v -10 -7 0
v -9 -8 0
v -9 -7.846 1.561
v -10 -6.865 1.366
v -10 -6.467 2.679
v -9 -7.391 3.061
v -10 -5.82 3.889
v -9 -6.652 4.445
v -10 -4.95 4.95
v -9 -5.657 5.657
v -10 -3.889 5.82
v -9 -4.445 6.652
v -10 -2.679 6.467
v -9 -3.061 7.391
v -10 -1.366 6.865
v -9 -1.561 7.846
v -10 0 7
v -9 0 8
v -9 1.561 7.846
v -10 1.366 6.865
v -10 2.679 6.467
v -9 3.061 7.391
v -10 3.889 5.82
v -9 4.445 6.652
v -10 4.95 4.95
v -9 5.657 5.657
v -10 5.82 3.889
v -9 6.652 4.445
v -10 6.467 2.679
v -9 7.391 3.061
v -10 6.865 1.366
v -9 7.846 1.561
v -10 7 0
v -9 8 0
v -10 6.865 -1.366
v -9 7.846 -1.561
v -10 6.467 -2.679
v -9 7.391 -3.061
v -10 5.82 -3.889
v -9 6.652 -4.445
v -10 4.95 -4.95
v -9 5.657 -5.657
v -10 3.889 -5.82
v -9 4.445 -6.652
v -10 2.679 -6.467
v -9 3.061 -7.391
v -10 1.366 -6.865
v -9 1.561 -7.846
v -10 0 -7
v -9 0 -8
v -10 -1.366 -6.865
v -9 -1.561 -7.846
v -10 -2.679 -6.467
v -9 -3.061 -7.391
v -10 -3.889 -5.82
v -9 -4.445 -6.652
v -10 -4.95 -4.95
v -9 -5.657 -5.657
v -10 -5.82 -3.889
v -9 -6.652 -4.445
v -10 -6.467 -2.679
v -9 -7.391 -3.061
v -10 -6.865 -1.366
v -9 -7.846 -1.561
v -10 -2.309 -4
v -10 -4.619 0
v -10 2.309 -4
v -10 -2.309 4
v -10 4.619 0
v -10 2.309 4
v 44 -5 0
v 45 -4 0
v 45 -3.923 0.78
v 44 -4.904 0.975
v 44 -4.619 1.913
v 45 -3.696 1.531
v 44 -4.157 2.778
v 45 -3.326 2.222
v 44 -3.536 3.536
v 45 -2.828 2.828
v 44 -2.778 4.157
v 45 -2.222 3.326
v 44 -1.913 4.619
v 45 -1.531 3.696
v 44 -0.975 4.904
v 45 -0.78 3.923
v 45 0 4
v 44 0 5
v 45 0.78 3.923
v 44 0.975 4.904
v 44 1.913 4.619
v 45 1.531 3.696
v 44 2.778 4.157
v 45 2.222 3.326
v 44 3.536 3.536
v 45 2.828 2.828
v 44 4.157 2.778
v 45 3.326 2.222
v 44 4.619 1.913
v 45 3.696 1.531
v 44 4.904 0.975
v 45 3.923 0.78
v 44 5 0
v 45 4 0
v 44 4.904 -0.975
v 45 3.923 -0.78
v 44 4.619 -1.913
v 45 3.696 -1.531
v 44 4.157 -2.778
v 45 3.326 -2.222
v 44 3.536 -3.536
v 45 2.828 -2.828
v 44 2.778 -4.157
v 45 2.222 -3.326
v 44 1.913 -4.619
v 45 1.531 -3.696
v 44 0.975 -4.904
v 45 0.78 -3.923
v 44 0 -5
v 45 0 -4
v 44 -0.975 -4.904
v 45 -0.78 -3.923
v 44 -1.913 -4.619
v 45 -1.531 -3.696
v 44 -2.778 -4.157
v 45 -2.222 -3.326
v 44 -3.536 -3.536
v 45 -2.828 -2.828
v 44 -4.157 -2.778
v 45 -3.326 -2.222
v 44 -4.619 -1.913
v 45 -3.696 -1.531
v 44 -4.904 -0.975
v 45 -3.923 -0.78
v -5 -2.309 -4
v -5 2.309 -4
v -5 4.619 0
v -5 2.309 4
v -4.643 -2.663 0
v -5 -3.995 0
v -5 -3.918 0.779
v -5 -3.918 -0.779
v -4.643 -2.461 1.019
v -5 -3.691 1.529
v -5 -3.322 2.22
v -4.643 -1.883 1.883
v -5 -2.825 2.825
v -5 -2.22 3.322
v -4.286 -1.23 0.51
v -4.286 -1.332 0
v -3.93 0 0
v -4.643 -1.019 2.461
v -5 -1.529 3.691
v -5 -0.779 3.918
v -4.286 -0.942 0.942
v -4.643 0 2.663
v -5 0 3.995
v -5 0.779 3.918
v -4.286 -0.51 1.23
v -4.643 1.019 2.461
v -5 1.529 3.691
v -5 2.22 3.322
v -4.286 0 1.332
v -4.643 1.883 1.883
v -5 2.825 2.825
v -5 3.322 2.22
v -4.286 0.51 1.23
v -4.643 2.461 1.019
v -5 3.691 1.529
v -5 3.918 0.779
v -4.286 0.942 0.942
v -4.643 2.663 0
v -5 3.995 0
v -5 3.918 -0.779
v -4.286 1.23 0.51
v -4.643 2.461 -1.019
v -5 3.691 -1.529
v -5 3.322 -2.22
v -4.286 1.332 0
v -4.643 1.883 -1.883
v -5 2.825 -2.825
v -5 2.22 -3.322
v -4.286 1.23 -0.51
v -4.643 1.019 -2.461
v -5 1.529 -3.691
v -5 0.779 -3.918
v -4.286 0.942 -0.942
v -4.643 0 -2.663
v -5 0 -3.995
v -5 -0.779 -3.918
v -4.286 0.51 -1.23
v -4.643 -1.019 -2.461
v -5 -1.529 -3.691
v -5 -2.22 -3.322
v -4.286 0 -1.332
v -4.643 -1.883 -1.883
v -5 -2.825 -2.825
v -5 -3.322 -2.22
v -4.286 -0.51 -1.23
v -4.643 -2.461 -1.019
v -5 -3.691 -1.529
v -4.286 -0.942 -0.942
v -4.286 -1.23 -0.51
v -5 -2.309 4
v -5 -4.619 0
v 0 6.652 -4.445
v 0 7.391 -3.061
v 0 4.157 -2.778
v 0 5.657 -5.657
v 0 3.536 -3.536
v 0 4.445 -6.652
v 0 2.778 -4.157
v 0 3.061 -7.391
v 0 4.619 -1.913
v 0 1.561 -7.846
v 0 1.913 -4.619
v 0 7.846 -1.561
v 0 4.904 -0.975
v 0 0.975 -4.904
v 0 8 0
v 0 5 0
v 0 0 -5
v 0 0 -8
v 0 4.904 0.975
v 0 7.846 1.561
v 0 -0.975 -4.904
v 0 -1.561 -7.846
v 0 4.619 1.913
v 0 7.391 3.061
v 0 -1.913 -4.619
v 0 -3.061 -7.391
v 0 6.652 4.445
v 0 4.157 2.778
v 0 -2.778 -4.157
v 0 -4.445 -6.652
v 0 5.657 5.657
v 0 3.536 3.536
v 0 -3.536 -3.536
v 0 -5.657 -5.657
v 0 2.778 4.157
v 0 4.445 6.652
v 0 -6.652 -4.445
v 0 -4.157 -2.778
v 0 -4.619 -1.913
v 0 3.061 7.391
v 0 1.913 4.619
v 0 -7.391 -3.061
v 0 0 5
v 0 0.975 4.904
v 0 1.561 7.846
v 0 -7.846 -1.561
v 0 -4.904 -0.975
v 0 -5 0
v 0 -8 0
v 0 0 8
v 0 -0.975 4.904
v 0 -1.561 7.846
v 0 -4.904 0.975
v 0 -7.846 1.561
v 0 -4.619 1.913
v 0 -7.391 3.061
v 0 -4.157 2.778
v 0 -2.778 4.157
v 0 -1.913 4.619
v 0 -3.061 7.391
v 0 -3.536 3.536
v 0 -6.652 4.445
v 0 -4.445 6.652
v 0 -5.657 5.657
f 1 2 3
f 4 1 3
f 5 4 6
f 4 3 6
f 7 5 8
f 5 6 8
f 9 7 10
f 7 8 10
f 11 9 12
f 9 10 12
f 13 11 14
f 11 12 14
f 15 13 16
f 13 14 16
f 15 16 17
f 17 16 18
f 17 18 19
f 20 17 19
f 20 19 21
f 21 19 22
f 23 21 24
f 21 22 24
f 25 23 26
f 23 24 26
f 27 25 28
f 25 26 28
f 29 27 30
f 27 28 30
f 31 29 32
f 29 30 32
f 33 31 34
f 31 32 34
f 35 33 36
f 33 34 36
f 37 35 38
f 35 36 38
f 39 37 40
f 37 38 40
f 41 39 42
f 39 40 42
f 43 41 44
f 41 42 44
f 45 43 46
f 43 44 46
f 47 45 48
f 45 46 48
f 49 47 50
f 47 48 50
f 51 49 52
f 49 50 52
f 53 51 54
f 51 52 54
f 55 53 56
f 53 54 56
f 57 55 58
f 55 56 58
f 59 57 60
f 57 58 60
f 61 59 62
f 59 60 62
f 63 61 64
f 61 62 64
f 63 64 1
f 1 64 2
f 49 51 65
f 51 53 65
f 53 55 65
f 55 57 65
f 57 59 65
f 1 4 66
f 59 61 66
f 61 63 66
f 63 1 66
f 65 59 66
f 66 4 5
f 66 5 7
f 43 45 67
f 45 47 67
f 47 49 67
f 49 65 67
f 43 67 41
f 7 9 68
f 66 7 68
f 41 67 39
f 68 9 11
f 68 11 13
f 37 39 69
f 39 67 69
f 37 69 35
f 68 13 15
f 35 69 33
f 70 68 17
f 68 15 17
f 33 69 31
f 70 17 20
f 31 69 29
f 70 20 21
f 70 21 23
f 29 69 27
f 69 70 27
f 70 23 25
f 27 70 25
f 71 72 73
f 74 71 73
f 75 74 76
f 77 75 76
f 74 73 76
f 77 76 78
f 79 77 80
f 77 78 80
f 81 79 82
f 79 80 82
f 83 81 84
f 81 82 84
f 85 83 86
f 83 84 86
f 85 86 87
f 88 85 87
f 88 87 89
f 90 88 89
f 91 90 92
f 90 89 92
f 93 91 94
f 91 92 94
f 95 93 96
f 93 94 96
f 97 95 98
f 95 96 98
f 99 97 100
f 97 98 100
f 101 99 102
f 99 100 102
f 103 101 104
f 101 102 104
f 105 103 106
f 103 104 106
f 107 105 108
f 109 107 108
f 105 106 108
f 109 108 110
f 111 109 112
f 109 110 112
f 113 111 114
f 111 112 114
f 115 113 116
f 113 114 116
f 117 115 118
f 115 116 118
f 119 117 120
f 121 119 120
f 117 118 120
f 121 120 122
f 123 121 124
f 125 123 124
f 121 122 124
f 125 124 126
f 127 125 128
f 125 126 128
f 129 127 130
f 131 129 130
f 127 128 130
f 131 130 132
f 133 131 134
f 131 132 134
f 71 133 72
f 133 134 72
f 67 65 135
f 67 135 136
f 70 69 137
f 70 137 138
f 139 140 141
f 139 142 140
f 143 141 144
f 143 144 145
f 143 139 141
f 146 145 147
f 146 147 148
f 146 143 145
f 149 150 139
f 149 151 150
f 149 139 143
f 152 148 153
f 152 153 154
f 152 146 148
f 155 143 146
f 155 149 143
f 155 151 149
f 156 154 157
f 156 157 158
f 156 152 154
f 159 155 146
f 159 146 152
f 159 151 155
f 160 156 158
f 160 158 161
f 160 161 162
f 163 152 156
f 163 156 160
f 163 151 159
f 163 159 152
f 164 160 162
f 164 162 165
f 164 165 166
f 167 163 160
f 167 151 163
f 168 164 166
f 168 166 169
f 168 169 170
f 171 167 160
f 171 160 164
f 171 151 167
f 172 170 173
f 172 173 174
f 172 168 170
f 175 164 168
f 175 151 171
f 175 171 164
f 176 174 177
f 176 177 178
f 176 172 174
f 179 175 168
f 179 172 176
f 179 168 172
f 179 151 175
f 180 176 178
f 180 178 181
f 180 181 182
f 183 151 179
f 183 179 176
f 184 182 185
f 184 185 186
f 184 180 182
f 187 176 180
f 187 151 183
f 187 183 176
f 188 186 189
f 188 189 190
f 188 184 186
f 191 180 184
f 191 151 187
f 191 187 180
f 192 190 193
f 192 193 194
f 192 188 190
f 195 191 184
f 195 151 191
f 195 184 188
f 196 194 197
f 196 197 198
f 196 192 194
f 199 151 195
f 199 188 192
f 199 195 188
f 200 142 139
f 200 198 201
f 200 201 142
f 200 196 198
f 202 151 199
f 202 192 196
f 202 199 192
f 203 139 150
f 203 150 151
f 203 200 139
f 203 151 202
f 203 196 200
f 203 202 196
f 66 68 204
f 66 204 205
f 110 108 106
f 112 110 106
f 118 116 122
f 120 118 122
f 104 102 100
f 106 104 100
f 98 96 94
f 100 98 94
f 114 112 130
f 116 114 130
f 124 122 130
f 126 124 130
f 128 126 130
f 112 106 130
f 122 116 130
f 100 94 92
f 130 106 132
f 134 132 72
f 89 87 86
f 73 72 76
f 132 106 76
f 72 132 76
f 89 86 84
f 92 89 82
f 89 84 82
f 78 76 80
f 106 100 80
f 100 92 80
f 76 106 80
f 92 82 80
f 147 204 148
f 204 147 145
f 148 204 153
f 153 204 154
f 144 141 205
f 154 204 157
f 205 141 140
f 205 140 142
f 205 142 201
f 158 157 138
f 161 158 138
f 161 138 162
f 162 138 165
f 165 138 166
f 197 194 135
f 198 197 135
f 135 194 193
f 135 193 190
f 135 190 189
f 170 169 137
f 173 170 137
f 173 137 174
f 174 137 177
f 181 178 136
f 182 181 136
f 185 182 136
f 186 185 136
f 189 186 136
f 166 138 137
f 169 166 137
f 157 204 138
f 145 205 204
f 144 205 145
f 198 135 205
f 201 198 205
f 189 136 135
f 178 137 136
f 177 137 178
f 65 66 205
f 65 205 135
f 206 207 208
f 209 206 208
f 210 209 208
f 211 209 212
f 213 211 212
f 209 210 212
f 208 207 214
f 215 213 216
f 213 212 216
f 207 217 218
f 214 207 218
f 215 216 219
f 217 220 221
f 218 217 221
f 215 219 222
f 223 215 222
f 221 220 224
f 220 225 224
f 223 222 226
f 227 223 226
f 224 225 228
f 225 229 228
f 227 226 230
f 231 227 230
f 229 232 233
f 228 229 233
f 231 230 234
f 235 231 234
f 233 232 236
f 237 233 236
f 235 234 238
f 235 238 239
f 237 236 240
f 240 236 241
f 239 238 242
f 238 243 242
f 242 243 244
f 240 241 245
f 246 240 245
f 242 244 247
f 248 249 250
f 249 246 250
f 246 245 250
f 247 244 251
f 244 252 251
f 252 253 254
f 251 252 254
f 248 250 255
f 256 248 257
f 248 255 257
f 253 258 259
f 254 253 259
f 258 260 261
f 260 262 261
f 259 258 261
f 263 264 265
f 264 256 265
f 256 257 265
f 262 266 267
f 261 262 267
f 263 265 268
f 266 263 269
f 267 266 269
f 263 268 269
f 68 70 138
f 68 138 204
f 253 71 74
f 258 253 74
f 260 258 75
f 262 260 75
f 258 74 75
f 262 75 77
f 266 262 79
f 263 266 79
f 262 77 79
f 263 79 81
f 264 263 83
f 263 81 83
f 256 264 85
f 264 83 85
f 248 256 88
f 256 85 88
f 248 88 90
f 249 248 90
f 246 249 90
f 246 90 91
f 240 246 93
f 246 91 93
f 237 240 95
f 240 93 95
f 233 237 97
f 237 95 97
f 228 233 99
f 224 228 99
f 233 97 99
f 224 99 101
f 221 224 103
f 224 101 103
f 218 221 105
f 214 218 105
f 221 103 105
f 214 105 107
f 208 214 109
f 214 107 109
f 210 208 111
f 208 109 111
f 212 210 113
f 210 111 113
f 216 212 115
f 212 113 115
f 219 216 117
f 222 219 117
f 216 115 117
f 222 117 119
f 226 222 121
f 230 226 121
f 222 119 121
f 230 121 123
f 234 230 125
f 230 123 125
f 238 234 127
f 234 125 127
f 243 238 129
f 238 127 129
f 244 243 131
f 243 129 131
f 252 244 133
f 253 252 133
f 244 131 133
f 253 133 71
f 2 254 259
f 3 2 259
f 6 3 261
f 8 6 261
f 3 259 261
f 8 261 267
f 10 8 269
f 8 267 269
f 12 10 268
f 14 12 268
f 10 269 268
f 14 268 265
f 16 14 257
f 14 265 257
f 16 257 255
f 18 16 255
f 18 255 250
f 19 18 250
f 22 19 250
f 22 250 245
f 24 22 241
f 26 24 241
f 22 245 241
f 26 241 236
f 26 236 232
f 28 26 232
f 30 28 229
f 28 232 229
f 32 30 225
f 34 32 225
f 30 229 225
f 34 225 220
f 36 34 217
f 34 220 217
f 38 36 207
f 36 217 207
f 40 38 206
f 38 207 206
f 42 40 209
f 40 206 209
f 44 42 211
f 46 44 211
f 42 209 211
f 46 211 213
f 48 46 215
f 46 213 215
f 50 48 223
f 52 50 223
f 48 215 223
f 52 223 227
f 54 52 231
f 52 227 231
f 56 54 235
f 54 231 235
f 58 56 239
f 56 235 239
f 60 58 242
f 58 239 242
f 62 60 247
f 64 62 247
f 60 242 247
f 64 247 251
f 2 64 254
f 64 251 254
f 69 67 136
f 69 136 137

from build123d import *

# Parameters (mm, degrees)
CUT_EXTRUDE1_DEPTH = 5
CHAMFER1_SIZE      = 1


with BuildPart() as part:
    # Sketch1 → Revolve1 (revolve)
    with BuildSketch(Plane.XY, mode=Mode.PRIVATE) as revolve1_sk:
        Polygon((-10, 0), (-10, 8), (0, 8), (0, 5), (45, 5), (45, 0), align=None)
    revolve(revolve1_sk.sketch.rotate(Axis((45, 0, 0), (-1, 0, 0)), 180), axis=Axis((45, 0, 0), (-1, 0, 0)))

    # Sketch2 → Cut-Revolve1 (revolve, cut)
    with BuildSketch(Plane.XY, mode=Mode.PRIVATE) as cut_revolve1_sk:
        Polygon((-10, 0), (-10, 3.995), (-5, 3.995), (-3.929542976, 0), align=None)
    revolve(cut_revolve1_sk.sketch.rotate(Axis((-3.929542976, 0, 0), (-1, 0, 0)), 180), axis=Axis((-3.929542976, 0, 0), (-1, 0, 0)), mode=Mode.SUBTRACT)

    # Sketch3 → Cut-Extrude1 (cut)
    with BuildSketch(Plane(origin=(-10, 0, 0), x_dir=(0, 0, -1), z_dir=(1, 0, 0))):
        Polygon((0, 4.618802154), (-4, 2.309401077), (-4, -2.309401077), (0, -4.618802154), (4, -2.309401077), (4, 2.309401077), align=None)
    extrude(amount=CUT_EXTRUDE1_DEPTH, mode=Mode.SUBTRACT)

    # Chamfer1
    chamfer1_edges = [part.edges().sort_by_distance(p)[0] for p in [
        (45, 5, 0),
        (-10, 8, 0),
    ]]
    chamfer(chamfer1_edges, length=CHAMFER1_SIZE)


solid = part.part
